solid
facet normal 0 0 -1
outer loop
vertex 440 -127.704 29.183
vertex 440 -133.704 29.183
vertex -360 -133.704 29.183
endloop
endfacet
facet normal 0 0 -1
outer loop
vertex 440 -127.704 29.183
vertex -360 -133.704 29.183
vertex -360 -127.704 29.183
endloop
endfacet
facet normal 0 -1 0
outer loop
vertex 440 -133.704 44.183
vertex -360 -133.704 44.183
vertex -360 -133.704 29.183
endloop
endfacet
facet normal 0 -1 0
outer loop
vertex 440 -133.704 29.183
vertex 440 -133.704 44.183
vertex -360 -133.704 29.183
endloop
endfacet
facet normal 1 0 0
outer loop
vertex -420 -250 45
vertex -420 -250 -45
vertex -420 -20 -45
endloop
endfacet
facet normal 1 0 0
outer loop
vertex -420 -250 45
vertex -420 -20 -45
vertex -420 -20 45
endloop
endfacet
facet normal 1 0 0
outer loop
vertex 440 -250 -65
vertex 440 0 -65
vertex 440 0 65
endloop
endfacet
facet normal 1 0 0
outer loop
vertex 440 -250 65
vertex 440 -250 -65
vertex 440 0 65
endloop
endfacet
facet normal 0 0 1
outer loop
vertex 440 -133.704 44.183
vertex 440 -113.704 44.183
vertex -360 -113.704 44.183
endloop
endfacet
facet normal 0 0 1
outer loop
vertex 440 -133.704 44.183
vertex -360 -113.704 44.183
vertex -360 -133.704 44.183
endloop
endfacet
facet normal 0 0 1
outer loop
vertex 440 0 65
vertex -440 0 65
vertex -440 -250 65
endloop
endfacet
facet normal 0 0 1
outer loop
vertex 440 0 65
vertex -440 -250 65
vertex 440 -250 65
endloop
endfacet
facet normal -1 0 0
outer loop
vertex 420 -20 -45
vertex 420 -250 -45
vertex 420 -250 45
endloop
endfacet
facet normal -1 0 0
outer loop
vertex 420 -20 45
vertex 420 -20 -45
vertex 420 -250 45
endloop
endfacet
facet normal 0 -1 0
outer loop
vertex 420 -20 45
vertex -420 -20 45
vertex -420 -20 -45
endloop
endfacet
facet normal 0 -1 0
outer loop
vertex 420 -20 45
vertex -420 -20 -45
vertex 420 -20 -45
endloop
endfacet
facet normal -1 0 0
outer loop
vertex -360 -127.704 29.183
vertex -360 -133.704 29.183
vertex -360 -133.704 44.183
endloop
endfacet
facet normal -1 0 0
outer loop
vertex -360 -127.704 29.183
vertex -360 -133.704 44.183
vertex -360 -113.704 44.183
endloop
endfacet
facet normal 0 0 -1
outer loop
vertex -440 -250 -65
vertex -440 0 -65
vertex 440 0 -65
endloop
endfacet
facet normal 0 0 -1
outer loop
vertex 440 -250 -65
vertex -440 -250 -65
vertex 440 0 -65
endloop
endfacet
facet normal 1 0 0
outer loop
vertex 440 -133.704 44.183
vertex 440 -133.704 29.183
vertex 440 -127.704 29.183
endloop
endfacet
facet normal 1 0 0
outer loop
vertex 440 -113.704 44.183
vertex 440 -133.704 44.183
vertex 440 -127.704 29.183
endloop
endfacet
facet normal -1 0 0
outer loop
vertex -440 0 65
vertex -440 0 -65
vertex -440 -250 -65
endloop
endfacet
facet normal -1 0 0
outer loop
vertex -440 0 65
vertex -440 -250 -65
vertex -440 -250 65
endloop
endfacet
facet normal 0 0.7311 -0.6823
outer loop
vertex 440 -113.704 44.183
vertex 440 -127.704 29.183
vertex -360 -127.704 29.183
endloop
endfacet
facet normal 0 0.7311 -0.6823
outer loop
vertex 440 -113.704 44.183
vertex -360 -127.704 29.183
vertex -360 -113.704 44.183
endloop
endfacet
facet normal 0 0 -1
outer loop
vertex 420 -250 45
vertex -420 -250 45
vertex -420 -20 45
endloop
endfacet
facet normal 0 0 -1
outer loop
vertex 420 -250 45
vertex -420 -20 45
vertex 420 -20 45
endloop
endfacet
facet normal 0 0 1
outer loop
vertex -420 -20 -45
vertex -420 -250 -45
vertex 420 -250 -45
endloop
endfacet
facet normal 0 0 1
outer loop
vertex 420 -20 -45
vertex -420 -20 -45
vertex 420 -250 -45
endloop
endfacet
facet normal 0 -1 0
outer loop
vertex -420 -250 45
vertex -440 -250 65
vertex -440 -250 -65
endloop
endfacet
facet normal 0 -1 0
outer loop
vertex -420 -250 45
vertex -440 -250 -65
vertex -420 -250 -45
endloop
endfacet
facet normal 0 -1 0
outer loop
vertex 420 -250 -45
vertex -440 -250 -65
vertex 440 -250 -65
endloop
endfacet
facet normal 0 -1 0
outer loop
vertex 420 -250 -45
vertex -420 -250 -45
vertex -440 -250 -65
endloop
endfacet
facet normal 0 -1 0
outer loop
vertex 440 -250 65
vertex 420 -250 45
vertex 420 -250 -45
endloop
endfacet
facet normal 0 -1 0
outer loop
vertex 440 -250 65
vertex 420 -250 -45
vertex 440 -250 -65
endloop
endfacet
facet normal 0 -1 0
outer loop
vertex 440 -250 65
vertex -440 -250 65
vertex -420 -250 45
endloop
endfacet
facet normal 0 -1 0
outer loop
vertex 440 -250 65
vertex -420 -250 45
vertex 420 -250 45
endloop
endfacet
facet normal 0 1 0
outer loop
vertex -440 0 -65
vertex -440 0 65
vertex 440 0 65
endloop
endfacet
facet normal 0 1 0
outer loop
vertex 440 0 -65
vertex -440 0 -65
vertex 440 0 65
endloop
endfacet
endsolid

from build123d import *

# Parameters (mm, degrees)
F0_W     = 880
F0_H     = 130
F1_DEPTH = 250
F2_W     = 840
F2_H     = 90
F3_DEPTH = 230
F5_DEPTH = 800


with BuildPart() as f1:
    # F0 (on Front) → F1 (new body)
    with BuildSketch(Plane.XZ):
        Rectangle(F0_W, F0_H)
    extrude(amount=F1_DEPTH)

    # F2 (on face) → F3 (cut)
    with BuildSketch(Plane.XZ.offset(250)):
        Rectangle(F2_W, F2_H)
    extrude(amount=-F3_DEPTH, mode=Mode.SUBTRACT)


with BuildPart() as f5:
    # F4 (on face) → F5 (new body)
    with BuildSketch(Plane.YZ.offset(440)):
        Polygon((-127.704231, 29.183104), (-113.704231, 44.183104), (-133.704231, 44.183104), (-133.704231, 29.183104), align=None)
    extrude(amount=-F5_DEPTH)


solid = Compound([f1.part, f5.part])
